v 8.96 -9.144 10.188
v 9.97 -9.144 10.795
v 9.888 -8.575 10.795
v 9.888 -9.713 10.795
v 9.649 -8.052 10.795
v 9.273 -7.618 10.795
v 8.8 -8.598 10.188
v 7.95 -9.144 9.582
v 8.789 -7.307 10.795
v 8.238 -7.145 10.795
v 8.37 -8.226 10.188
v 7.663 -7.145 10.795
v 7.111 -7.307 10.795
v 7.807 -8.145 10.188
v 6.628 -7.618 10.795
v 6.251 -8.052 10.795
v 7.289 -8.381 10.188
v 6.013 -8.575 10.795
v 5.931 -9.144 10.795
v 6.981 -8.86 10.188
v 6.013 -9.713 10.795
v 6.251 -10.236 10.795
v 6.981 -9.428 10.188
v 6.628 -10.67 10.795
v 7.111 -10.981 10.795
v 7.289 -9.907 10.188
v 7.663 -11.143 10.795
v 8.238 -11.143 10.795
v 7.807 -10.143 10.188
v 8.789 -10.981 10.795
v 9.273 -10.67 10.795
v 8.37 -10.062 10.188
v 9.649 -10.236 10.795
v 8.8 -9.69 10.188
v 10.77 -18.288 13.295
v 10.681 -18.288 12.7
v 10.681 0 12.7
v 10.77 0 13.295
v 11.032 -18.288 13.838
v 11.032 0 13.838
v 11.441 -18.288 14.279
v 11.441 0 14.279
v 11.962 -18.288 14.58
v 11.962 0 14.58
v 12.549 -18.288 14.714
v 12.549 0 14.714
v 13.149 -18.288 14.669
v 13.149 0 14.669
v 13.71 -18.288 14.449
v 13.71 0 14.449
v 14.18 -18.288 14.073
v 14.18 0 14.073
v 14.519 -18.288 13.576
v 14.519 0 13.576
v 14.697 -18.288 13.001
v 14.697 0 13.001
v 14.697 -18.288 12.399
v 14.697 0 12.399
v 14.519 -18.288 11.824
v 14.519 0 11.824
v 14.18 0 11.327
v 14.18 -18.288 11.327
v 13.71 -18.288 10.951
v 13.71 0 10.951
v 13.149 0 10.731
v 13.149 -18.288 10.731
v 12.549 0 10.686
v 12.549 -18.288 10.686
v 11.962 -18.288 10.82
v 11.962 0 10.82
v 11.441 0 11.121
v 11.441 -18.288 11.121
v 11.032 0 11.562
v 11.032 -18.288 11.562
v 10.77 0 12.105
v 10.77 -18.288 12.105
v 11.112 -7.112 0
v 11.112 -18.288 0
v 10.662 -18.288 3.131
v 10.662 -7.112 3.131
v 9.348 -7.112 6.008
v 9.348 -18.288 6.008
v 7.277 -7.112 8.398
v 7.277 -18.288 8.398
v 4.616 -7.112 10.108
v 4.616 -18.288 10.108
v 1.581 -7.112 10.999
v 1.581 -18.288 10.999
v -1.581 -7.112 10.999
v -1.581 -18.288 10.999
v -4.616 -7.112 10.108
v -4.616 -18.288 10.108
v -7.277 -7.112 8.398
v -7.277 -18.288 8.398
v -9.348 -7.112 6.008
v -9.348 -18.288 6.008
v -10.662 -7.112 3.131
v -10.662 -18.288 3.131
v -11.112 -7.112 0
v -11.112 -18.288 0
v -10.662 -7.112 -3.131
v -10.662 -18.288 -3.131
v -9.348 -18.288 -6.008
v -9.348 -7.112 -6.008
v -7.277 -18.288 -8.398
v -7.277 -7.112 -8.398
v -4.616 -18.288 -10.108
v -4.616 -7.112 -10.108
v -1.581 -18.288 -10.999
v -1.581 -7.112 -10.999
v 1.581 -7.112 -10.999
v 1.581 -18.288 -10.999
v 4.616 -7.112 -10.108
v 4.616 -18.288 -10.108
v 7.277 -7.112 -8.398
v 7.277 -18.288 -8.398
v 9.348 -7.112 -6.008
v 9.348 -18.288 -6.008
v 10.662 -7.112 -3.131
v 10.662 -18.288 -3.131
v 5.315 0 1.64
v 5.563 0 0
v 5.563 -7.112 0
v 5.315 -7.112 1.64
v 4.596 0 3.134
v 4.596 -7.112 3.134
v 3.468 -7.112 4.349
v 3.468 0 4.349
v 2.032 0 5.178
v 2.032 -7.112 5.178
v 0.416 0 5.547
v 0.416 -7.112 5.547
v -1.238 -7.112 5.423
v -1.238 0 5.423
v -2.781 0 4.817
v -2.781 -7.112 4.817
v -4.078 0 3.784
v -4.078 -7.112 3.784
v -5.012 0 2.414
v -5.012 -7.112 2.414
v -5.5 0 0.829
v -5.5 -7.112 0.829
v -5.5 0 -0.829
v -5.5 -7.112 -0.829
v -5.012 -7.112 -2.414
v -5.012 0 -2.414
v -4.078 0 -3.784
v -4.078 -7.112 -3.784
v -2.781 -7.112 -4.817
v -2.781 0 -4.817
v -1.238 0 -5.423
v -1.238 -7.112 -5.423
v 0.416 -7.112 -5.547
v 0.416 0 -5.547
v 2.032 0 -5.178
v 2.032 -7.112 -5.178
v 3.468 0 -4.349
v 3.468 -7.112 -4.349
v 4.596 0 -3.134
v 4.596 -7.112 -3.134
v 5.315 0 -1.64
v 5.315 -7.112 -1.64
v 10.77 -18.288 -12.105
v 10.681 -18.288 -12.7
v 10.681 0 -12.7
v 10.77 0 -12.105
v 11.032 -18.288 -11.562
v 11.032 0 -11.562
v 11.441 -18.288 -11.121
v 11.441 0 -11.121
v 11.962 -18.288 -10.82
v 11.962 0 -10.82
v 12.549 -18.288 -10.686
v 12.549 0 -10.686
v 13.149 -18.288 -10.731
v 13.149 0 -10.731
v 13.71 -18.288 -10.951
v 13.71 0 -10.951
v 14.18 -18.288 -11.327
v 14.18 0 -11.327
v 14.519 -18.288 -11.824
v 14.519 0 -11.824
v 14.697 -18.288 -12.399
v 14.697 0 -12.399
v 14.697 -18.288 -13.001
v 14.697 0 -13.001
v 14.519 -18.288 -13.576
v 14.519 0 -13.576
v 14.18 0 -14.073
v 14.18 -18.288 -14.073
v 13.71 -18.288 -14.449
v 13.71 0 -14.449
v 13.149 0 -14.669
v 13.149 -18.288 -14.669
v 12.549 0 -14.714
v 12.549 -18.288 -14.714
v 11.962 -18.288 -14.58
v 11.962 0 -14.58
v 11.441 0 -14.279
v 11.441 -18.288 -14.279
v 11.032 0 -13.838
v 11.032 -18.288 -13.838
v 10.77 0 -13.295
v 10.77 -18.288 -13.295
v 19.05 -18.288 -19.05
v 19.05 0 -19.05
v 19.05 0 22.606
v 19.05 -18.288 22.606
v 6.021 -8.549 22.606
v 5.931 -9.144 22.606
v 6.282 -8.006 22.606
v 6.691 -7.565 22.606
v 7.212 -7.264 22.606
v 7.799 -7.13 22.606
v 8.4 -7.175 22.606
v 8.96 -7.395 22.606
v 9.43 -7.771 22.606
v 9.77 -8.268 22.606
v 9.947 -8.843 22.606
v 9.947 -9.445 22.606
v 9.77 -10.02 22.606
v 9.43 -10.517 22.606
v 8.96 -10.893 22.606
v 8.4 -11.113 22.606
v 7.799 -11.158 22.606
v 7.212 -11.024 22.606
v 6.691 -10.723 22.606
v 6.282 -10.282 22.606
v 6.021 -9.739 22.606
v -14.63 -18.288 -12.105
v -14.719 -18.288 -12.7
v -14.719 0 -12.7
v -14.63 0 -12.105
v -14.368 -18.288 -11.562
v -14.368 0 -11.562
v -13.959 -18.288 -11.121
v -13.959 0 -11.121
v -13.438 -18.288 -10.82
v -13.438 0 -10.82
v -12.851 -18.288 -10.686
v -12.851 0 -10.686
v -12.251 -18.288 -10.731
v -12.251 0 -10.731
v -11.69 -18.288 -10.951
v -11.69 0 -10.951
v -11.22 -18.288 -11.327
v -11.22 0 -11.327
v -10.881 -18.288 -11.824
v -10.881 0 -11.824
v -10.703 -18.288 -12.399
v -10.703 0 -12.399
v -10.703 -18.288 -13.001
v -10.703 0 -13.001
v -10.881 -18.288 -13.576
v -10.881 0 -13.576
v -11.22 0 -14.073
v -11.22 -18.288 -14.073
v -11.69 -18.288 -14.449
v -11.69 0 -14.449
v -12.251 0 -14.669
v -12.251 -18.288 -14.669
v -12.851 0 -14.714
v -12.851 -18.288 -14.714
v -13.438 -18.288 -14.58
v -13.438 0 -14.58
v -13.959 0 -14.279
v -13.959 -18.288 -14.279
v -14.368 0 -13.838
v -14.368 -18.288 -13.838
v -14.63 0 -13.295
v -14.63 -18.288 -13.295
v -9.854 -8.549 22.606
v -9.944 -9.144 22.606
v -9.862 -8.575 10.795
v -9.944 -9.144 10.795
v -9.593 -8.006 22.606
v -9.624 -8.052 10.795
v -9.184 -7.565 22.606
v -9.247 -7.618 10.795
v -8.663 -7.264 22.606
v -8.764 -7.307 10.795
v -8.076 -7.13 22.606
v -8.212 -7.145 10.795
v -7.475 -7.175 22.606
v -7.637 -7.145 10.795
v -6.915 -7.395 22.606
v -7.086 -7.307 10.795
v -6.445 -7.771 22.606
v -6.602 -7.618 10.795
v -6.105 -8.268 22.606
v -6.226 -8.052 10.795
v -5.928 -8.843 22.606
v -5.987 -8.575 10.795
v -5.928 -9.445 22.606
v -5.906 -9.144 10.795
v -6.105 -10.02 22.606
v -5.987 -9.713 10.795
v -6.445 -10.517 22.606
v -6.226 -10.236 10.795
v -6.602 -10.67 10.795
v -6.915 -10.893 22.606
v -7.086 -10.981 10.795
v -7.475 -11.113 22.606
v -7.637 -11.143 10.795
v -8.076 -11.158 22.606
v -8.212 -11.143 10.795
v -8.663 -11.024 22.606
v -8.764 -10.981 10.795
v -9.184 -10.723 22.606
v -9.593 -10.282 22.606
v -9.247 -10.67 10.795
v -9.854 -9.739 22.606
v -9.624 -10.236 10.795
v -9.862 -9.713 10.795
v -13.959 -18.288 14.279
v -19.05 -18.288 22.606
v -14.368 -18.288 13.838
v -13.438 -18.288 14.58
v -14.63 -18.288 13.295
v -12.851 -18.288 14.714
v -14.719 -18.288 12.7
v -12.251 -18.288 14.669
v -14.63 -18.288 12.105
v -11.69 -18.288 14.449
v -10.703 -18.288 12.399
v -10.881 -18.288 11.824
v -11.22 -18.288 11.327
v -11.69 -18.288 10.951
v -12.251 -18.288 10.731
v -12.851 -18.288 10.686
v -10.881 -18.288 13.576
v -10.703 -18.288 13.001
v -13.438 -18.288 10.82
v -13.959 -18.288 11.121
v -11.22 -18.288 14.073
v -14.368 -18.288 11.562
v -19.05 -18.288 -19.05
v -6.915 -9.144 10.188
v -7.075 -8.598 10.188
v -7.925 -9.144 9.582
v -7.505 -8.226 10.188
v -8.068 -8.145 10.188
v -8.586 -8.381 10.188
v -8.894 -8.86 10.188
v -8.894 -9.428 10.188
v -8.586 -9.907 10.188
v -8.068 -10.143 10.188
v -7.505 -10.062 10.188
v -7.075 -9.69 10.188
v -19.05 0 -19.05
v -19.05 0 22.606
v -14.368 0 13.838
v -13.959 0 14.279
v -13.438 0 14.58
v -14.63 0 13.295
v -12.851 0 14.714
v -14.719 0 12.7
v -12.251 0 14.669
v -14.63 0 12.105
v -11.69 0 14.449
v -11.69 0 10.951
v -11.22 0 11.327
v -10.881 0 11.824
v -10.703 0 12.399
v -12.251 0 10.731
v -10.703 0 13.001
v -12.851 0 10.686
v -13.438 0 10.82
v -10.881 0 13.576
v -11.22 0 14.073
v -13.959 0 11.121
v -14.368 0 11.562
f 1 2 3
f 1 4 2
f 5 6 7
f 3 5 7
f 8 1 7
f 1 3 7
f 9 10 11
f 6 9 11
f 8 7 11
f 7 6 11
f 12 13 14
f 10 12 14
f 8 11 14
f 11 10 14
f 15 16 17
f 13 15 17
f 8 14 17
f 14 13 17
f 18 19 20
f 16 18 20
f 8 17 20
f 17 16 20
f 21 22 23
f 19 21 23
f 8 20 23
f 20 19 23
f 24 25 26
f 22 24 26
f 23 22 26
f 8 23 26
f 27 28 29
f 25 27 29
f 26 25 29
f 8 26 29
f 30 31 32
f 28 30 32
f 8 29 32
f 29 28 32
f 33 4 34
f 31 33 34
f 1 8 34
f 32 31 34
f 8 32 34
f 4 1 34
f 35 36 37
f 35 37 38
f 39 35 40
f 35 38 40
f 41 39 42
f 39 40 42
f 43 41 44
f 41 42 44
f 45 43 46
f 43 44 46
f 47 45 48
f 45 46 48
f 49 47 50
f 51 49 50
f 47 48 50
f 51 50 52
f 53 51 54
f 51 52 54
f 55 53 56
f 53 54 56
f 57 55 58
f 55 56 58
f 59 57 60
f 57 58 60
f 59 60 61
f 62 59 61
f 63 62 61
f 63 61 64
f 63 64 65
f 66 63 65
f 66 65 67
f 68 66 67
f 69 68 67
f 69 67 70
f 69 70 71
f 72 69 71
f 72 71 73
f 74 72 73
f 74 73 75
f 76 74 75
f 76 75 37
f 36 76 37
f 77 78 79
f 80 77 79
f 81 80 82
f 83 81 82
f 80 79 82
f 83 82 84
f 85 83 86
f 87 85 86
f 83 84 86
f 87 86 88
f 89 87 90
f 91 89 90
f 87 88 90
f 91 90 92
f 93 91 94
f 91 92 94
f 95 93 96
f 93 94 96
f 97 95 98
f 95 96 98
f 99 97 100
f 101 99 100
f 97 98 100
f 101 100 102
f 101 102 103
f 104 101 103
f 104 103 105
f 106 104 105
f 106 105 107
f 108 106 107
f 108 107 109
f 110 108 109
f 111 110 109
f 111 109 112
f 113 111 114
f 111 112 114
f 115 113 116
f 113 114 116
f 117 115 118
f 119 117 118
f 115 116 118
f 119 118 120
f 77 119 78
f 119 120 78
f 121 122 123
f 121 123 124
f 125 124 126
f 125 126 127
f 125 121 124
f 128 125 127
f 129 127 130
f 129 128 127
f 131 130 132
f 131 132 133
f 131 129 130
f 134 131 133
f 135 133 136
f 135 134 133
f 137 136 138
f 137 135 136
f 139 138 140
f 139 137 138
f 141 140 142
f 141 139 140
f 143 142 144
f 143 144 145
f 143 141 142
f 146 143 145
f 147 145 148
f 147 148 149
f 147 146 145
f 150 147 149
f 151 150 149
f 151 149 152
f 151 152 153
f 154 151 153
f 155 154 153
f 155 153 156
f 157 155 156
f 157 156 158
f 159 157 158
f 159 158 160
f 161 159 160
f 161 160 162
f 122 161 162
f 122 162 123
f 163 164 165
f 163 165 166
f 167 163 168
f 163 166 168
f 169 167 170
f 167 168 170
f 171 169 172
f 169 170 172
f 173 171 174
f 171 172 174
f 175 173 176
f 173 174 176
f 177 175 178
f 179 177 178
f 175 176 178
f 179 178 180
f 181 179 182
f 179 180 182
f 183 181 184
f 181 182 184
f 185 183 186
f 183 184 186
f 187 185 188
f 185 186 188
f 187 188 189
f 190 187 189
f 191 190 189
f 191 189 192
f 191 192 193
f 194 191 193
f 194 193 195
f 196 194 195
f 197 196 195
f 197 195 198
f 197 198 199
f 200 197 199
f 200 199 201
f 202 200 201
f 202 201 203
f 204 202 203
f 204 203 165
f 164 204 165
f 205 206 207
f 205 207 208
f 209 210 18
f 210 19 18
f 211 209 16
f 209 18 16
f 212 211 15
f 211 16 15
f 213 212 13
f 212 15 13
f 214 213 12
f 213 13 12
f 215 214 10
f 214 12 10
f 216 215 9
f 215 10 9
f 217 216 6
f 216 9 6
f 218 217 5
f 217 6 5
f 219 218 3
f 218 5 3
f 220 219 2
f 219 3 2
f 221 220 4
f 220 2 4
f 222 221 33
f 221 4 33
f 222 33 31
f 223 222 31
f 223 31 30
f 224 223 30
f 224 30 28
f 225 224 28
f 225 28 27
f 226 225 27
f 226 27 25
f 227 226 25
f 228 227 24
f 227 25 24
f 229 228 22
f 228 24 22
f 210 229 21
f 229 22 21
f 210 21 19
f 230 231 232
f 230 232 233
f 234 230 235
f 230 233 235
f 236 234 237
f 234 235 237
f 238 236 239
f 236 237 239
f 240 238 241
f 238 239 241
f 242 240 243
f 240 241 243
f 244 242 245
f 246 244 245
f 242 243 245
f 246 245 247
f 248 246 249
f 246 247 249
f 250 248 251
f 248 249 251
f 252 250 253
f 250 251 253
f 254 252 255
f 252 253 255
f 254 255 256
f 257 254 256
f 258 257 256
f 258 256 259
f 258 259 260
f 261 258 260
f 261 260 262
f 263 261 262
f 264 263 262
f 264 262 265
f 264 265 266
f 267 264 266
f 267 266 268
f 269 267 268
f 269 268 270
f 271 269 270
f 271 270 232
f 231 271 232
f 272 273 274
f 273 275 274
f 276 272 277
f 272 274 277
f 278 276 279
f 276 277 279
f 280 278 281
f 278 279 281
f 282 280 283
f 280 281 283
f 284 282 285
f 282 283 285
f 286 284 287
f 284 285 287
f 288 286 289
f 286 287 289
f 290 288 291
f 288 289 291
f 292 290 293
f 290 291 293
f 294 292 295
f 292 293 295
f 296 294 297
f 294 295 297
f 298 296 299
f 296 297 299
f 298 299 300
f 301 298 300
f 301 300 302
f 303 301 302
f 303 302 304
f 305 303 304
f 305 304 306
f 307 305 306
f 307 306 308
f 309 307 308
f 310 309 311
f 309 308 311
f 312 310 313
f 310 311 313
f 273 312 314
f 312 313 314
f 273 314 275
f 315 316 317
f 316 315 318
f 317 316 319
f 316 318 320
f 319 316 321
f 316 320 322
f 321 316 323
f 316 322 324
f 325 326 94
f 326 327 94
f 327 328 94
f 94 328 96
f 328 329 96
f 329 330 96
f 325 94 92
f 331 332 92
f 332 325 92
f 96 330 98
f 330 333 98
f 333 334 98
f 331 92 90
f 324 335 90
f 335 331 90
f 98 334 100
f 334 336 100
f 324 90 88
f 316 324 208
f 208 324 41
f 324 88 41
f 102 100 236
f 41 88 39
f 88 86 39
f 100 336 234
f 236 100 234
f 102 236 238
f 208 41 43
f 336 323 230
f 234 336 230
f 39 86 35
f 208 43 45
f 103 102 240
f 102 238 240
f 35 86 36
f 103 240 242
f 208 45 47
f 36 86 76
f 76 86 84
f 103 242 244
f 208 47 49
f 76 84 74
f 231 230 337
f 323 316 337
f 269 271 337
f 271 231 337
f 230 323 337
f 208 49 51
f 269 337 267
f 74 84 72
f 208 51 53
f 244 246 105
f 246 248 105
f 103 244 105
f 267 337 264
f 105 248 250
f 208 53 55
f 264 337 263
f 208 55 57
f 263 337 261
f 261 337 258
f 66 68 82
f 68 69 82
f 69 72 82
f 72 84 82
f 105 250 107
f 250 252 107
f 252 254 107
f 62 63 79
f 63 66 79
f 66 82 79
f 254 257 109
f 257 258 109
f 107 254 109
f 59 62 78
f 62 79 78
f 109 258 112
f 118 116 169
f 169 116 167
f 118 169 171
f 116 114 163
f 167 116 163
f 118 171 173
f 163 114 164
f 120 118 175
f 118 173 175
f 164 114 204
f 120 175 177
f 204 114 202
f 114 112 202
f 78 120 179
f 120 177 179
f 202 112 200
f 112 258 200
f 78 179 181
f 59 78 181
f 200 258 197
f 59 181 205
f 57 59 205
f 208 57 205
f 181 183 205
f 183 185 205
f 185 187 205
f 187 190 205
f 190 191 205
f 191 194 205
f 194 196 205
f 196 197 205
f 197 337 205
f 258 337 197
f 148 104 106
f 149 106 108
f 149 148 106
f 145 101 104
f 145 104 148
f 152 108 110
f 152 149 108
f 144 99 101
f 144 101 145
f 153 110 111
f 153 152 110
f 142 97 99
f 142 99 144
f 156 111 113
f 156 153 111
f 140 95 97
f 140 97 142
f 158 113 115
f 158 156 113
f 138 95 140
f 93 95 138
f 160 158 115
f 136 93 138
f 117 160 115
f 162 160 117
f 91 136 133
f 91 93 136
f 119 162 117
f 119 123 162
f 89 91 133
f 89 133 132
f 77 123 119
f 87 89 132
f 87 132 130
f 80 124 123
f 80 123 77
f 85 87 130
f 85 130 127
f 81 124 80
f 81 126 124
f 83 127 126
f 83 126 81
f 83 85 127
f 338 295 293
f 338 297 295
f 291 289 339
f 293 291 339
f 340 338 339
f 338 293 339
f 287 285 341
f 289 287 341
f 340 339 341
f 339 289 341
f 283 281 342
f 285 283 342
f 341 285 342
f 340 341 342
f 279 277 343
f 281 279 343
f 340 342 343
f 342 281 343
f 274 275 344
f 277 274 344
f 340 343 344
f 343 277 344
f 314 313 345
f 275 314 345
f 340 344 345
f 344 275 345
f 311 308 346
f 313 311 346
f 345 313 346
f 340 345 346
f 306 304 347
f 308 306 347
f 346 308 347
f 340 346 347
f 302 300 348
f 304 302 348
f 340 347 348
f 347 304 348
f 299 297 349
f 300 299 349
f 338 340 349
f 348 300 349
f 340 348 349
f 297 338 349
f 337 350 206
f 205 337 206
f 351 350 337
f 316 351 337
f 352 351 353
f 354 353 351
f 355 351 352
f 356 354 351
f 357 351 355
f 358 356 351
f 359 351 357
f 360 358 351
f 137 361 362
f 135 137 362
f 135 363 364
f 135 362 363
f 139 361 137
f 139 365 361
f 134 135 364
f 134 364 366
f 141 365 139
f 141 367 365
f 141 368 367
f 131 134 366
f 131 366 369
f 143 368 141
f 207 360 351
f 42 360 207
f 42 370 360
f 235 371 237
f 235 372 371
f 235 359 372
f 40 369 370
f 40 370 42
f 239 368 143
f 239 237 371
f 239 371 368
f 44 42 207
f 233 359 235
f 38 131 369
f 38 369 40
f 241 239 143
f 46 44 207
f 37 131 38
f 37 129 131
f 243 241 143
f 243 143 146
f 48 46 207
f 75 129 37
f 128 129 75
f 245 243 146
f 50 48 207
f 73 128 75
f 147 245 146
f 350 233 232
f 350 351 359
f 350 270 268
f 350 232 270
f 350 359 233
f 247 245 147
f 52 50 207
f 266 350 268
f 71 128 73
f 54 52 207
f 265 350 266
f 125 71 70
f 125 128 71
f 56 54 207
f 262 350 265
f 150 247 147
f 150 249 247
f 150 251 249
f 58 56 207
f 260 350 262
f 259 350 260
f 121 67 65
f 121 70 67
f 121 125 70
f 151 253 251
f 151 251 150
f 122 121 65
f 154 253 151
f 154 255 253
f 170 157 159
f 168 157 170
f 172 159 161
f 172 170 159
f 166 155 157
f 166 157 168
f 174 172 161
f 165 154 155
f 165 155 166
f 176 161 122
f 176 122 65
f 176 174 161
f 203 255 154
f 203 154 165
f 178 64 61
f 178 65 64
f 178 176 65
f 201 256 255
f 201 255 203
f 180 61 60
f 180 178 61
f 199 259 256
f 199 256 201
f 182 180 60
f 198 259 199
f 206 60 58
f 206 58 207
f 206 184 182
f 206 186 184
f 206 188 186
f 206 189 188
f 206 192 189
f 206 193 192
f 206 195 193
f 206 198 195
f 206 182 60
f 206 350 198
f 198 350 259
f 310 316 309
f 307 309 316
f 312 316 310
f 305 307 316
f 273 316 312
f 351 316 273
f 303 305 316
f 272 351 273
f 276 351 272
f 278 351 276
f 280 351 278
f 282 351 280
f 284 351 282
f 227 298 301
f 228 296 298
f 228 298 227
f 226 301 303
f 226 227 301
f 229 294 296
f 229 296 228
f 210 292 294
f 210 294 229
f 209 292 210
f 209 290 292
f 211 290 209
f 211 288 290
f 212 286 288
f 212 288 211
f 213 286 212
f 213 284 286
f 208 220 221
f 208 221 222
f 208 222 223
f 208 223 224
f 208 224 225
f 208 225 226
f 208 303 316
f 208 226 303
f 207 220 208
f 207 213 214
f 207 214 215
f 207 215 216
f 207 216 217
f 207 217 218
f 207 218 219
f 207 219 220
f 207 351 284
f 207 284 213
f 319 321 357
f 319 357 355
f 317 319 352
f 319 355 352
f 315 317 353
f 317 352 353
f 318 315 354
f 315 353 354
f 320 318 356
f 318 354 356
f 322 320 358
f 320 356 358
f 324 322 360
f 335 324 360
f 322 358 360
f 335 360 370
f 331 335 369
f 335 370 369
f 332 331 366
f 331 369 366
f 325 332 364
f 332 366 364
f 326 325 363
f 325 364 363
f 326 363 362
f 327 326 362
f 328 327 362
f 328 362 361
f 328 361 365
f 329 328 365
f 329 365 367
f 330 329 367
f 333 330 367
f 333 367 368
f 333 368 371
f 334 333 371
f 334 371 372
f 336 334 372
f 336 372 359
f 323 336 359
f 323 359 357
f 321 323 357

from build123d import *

# Parameters (mm, degrees)
F0_W     = 38.1
F0_H     = 38.1
F0_R     = 5.5626
F1_DEPTH = 18.288
F3_D     = 4.0386
F4_R     = 11.1125
F4_R_2   = 5.5626
F5_DEPTH = 11.176
F6_DEPTH = 3.556
F8_D     = 4.0386
F8_DEPTH = 11.811
F8_TIP   = 1.213317848


with BuildPart() as f1:
    # F0 (on Front) → F1 (new body)
    with BuildSketch(Plane.XZ):
        Rectangle(F0_W, F0_H)
        Circle(F0_R, mode=Mode.SUBTRACT)
    extrude(amount=F1_DEPTH)

    # F3 (through all)
    with Locations(Plane.XZ.offset(18.288)):
        with Locations((-12.7, -12.7), (-12.7, 12.7), (12.7, 12.7), (12.7, -12.7)):
            Hole(F3_D / 2)

    # F4 (on face) → F5 (cut)
    with BuildSketch(Plane.XZ.offset(18.288)):
        Circle(F4_R)
        Circle(F4_R_2, mode=Mode.SUBTRACT)
    extrude(amount=-F5_DEPTH, mode=Mode.SUBTRACT)

    # F6 (add): a face of the model
    f6_faces = [f1.faces().sort_by_distance(p)[0] for p in [
        (0, -9.144, 19.05),
    ]]
    extrude(f6_faces, amount=F6_DEPTH)

    # F8
    with Locations(Plane.XY.offset(22.606)):
        with Locations((-7.9248, -9.144), (7.9502, -9.144)):
            Hole(F8_D / 2, depth=F8_DEPTH)
            with Locations((0, 0, -(F8_DEPTH + F8_TIP / 2))):  # 118° drill point
                Cone(0, F8_D / 2, F8_TIP, mode=Mode.SUBTRACT)


solid = f1.part
